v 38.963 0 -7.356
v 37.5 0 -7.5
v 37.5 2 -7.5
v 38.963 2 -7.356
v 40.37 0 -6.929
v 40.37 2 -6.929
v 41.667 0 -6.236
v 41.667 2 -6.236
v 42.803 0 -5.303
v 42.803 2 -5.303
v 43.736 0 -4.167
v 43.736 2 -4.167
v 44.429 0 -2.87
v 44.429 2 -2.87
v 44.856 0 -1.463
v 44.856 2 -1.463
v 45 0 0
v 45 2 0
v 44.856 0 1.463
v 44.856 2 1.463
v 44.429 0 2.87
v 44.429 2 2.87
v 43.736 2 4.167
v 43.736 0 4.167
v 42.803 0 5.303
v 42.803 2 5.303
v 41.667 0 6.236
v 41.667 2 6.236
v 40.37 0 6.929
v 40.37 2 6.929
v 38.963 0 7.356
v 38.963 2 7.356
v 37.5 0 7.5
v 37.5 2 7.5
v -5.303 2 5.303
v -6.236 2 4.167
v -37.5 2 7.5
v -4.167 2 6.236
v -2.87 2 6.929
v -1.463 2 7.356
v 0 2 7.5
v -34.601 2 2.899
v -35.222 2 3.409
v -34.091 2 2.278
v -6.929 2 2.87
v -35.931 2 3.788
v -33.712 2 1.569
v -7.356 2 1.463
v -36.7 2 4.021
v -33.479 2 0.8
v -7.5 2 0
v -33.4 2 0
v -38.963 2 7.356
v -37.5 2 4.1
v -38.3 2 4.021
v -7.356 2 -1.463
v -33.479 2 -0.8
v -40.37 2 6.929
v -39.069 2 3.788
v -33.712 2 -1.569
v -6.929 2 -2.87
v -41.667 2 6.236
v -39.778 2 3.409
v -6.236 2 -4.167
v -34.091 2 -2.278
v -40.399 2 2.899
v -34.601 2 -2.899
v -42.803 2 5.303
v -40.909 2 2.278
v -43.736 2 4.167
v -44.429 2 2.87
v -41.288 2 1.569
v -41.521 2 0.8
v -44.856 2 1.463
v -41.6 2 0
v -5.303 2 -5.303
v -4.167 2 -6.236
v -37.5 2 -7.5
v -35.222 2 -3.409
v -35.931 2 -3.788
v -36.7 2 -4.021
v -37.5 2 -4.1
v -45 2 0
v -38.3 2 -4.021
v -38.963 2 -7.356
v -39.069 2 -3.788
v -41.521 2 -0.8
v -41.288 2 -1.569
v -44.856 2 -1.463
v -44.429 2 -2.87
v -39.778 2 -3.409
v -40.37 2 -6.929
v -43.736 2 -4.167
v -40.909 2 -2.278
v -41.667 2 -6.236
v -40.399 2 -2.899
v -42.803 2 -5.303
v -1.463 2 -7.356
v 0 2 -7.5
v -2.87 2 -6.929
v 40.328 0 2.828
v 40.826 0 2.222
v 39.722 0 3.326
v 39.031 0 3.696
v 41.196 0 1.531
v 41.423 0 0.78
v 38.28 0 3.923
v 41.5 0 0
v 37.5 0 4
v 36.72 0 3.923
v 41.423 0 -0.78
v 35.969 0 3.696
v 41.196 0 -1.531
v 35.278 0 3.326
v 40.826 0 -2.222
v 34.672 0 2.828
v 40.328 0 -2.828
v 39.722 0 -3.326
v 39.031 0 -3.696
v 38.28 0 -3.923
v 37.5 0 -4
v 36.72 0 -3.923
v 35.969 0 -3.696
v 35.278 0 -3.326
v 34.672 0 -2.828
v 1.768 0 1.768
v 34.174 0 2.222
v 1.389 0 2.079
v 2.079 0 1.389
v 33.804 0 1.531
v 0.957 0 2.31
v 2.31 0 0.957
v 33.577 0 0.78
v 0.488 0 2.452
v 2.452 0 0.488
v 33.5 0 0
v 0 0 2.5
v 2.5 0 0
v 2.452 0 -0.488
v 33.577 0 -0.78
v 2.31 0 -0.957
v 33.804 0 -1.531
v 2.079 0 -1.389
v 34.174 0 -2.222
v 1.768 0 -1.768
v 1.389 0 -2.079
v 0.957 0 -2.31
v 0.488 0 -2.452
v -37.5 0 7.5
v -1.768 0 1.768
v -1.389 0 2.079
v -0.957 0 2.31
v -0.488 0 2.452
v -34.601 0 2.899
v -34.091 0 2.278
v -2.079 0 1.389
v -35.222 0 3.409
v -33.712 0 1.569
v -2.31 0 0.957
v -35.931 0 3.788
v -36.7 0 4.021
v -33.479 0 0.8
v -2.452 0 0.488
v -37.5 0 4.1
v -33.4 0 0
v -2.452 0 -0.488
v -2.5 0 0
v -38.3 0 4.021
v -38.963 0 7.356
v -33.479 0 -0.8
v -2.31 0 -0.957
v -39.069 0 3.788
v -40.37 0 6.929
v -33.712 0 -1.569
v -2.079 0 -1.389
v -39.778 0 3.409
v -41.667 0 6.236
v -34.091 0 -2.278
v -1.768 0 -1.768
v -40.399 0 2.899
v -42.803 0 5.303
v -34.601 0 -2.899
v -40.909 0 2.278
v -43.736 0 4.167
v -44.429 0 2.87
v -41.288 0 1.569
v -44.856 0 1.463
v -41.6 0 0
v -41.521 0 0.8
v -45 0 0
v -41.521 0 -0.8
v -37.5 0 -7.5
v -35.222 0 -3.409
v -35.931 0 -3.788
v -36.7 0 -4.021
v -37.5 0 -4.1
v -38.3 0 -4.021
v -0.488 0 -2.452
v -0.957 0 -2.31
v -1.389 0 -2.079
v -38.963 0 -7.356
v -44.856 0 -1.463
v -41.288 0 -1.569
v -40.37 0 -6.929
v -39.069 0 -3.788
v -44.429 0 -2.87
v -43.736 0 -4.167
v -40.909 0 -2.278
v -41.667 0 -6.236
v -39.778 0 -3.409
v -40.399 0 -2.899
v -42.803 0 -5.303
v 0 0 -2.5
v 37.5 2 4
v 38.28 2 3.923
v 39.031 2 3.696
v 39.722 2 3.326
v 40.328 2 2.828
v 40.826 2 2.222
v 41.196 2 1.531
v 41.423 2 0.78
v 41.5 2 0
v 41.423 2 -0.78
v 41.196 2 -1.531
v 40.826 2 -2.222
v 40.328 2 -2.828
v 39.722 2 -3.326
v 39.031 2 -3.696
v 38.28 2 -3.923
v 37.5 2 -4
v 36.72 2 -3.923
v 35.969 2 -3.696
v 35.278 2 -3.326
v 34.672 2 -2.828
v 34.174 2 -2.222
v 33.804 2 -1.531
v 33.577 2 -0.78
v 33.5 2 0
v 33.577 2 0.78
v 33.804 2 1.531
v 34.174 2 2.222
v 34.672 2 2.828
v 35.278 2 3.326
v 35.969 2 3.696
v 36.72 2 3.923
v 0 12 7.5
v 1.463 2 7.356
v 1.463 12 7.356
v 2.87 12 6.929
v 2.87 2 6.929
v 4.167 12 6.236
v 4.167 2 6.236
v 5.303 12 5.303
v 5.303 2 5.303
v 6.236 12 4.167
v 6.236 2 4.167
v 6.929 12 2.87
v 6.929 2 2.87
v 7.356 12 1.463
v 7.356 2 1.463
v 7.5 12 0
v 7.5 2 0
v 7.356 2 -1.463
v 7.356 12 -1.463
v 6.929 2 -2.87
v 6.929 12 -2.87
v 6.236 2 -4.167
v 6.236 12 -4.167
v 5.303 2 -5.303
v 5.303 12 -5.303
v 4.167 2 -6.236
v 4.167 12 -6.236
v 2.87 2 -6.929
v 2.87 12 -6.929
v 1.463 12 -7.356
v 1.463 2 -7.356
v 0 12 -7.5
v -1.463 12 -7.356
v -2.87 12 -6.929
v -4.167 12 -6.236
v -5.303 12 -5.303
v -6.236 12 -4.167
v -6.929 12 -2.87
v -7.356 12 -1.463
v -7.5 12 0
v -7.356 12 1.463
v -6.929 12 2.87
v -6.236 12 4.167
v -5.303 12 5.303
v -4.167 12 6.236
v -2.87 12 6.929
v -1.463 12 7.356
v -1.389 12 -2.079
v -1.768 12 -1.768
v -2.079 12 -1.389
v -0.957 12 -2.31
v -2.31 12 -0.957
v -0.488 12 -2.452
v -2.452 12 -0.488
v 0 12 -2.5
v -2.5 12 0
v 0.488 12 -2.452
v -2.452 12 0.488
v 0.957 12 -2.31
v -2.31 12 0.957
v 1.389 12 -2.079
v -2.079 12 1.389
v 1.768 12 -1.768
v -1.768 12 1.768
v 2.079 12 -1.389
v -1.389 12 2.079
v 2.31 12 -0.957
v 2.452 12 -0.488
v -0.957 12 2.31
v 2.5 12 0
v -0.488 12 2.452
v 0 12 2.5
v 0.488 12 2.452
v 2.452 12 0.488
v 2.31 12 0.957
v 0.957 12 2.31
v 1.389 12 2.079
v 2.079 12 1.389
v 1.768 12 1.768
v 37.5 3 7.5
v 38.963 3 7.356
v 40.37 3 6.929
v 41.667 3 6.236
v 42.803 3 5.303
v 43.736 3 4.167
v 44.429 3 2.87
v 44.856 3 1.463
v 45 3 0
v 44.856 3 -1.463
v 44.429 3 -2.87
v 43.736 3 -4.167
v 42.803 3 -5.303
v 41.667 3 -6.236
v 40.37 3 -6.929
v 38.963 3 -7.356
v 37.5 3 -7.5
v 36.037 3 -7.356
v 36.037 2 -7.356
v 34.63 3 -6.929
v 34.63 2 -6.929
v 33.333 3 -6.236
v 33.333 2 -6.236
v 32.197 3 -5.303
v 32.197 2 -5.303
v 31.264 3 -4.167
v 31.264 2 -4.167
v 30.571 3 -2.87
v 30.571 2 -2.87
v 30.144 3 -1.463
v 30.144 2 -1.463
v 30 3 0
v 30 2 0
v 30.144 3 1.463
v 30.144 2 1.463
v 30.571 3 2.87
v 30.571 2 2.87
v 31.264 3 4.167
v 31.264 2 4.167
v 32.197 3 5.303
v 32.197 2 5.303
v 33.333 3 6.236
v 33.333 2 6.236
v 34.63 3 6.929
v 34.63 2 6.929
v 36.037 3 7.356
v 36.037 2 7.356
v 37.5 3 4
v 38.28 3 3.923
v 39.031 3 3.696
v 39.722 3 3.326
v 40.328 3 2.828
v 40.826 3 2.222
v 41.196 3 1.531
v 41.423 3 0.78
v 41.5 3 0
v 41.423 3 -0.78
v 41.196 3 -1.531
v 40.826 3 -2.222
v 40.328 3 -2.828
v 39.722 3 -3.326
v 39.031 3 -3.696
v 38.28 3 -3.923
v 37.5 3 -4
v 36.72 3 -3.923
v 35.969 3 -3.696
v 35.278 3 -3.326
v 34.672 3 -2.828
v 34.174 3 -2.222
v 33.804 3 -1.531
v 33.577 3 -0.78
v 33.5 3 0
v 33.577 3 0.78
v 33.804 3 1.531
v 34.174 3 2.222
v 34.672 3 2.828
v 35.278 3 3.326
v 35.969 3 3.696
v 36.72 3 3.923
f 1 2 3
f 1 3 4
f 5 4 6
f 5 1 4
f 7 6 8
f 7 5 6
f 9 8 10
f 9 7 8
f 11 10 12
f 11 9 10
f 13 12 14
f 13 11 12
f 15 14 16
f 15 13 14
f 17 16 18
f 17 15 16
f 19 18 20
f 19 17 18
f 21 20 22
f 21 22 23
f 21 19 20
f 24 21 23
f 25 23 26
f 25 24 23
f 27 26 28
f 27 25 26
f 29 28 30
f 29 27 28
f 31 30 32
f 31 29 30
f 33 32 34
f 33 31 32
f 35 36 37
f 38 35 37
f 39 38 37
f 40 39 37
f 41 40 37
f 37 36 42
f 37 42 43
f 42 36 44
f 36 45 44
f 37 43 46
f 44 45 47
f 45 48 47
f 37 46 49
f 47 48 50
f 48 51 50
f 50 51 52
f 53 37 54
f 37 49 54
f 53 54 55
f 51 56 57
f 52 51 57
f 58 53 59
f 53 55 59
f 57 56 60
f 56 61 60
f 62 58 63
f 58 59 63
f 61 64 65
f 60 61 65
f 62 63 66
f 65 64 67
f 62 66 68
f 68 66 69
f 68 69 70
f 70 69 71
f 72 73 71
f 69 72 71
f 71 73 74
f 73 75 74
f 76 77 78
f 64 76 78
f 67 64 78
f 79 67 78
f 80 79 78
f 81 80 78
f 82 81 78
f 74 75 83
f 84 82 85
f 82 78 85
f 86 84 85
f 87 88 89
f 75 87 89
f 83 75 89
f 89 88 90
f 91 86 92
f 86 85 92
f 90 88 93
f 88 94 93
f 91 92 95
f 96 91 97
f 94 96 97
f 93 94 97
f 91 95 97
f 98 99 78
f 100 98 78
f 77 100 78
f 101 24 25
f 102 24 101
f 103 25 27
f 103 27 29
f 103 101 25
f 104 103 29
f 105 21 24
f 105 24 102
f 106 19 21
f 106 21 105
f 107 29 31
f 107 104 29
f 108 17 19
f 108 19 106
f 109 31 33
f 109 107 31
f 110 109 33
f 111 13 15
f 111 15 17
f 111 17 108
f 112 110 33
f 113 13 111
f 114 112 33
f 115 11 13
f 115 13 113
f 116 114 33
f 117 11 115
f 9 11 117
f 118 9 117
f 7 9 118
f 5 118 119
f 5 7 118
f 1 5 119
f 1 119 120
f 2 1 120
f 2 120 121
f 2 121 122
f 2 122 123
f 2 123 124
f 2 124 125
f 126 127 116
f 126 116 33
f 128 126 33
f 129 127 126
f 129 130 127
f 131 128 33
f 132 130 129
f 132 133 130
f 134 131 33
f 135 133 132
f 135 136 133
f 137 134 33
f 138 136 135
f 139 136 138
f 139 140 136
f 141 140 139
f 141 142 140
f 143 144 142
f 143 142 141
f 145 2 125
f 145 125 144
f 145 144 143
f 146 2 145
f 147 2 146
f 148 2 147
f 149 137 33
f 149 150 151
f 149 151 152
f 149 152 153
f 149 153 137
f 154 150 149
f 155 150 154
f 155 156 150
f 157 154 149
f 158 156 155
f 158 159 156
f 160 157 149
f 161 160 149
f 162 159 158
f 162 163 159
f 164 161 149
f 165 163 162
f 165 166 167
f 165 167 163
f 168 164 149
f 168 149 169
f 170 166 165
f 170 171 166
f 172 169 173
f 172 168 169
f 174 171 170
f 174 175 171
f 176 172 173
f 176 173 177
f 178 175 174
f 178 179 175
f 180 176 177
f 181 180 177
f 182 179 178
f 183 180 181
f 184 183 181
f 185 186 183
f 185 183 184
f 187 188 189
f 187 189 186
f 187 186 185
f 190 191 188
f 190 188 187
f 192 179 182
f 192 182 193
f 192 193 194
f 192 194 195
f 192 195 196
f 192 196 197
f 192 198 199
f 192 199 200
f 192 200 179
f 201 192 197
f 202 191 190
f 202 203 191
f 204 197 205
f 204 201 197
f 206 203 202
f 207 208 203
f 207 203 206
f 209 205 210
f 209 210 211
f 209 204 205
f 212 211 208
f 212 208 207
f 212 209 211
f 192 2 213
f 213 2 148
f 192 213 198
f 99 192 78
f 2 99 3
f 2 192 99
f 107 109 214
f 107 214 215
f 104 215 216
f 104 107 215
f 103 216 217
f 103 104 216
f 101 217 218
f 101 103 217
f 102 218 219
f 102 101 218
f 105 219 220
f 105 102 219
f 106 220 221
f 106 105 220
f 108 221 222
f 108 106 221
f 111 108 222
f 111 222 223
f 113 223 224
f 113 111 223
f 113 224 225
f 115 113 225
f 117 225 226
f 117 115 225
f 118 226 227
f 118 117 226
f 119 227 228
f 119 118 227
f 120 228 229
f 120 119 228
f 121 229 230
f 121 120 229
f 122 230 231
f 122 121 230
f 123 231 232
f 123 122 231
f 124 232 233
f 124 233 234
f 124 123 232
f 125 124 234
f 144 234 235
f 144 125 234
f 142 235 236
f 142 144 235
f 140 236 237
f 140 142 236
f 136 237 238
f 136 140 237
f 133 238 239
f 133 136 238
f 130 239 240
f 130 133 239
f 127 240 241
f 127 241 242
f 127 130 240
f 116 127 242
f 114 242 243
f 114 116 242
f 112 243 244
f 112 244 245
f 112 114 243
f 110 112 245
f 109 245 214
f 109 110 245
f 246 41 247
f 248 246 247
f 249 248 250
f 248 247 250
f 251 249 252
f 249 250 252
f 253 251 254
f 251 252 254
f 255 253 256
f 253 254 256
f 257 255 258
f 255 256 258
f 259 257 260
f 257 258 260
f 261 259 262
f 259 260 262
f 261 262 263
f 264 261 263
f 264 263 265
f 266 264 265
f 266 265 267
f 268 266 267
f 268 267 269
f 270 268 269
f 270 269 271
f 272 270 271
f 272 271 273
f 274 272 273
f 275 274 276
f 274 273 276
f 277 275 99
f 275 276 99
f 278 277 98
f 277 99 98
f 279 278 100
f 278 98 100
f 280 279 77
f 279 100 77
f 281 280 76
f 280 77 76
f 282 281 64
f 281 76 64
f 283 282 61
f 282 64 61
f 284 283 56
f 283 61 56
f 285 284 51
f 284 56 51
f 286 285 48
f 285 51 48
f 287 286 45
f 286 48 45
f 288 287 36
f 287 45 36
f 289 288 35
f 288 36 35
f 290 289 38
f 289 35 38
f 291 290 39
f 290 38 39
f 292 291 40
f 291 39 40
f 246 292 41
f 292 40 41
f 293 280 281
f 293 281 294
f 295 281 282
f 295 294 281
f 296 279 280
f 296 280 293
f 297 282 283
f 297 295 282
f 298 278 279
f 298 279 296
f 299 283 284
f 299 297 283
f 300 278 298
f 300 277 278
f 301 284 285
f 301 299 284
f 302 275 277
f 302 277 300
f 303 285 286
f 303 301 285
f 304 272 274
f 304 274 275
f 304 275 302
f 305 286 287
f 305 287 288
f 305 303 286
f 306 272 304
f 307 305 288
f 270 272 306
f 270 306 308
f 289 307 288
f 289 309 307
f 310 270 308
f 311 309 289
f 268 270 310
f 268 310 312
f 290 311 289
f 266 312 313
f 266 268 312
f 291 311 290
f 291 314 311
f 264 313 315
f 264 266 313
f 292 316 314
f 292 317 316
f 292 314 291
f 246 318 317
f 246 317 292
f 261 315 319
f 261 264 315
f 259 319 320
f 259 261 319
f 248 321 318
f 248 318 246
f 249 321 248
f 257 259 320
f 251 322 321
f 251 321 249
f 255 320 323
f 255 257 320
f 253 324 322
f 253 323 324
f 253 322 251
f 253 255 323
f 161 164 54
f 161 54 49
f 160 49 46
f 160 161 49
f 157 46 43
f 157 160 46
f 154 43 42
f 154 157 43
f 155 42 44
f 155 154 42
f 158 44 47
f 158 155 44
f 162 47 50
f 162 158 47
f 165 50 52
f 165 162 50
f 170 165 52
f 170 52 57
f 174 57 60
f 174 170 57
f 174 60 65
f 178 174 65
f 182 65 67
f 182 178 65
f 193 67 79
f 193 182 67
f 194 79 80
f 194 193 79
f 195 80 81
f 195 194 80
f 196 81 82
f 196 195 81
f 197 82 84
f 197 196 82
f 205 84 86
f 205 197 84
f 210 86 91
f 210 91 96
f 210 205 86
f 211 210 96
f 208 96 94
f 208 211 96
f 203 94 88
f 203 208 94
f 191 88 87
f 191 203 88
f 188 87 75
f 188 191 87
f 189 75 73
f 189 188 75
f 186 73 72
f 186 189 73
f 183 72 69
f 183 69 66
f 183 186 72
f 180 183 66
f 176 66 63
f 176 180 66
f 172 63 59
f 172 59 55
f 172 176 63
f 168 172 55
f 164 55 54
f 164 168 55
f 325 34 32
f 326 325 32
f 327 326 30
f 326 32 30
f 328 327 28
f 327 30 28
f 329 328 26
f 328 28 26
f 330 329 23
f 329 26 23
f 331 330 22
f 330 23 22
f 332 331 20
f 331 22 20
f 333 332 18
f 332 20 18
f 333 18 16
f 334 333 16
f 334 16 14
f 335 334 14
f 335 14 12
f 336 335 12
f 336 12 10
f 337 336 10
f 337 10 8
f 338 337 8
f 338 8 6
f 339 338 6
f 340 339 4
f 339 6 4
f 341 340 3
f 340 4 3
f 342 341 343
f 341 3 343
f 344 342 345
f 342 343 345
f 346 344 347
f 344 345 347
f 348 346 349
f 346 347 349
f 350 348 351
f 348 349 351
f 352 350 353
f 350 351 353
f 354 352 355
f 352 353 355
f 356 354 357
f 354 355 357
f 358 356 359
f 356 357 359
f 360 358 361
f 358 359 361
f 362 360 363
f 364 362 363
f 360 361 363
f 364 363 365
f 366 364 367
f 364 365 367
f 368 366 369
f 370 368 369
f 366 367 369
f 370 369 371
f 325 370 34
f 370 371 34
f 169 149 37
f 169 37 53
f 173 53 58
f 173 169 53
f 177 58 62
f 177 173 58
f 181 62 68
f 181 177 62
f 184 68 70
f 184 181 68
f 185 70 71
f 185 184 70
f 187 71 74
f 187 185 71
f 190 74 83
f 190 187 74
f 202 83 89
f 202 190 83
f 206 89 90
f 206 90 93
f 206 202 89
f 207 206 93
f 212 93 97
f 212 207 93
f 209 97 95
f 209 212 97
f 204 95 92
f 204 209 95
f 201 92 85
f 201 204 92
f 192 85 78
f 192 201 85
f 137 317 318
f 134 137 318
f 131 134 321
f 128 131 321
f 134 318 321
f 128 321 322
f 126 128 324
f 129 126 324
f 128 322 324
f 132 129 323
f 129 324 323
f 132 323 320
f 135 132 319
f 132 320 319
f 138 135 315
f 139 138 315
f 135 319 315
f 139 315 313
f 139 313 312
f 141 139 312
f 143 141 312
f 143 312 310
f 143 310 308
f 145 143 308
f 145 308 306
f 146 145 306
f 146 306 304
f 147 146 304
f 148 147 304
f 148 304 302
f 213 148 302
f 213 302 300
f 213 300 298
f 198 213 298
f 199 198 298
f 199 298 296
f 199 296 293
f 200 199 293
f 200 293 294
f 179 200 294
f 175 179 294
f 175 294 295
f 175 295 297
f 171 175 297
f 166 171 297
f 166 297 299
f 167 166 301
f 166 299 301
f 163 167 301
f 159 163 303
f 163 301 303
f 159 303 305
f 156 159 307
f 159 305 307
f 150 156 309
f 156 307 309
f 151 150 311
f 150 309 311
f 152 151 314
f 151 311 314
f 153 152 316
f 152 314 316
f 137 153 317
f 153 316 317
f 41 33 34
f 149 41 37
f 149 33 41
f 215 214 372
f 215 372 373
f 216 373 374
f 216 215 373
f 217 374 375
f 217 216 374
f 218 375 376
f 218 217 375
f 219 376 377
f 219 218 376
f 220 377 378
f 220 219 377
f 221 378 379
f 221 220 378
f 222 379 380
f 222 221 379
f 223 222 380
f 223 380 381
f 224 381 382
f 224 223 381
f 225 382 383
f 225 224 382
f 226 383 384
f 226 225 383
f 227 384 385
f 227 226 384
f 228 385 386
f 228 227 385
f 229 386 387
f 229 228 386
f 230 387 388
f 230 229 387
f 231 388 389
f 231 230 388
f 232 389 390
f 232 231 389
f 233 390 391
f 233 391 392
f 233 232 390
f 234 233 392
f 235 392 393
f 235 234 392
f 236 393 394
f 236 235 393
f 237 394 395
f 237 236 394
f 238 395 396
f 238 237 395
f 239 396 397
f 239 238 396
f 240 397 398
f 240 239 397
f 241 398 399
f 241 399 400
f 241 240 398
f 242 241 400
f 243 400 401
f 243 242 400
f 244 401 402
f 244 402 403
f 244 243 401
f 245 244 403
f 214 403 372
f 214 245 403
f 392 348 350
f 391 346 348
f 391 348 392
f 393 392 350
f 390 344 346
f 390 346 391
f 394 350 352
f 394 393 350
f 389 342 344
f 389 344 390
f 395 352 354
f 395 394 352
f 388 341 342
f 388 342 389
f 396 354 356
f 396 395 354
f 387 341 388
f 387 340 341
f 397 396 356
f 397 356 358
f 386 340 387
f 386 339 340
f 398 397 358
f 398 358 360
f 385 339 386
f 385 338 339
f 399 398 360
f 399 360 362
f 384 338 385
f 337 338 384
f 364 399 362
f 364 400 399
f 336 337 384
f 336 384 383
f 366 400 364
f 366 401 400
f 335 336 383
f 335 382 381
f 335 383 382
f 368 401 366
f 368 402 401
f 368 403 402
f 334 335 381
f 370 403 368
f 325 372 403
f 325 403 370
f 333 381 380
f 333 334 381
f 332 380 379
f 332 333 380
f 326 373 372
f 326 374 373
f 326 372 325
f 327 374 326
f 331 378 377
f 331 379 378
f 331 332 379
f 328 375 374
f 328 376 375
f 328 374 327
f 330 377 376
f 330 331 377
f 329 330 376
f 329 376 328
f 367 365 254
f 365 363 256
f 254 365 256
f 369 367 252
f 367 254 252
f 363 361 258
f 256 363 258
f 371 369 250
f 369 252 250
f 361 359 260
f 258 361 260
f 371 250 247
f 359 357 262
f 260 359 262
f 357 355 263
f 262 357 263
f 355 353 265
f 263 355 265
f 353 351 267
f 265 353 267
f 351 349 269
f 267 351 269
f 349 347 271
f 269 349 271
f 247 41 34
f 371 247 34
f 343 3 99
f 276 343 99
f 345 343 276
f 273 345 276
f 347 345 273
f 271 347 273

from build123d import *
from build123d.topology import SkipClean

# Parameters (mm, degrees)
SKETCH1_R           = 4.1
SKETCH1_R_2         = 4
BOSS_EXTRUDE1_DEPTH = 2
SKETCH3_R           = 7.5
BOSS_EXTRUDE3_DEPTH = 10
SKETCH4_R           = 2.5
CUT_EXTRUDE1_DEPTH  = 48.172555581
SKETCH5_R           = 7.5
SKETCH5_R_2         = 4
BOSS_EXTRUDE4_DEPTH = 1


with BuildPart() as part:
    # Sketch1 → Boss-Extrude1 (new body)
    with BuildSketch(Plane(origin=(0, 0, 0), x_dir=(1, 0, 0), z_dir=(0, 1, 0))):
        with BuildLine():
            Line((-37.5, 7.5), (37.5, 7.5))
            ThreePointArc((37.5, 7.5), (45, 0), (37.5, -7.5))
            Line((37.5, -7.5), (-37.5, -7.5))
            ThreePointArc((-37.5, -7.5), (-45, 0), (-37.5, 7.5))
        make_face()
        with Locations((-37.5, 0)):
            Circle(SKETCH1_R, mode=Mode.SUBTRACT)
        with Locations((37.5, 0)):
            Circle(SKETCH1_R_2, mode=Mode.SUBTRACT)
    extrude(amount=BOSS_EXTRUDE1_DEPTH)

    # Sketch3 → Boss-Extrude3 (add)
    with BuildSketch(Plane(origin=(0, 2, 0), x_dir=(1, 0, 0), z_dir=(0, 1, 0))):
        Circle(SKETCH3_R)
    extrude(amount=BOSS_EXTRUDE3_DEPTH)

    # Sketch4 → Cut-Extrude1 (cut, through all)
    with BuildSketch(Plane(origin=(0, 12, 0), x_dir=(1, 0, 0), z_dir=(0, 1, 0))):
        Circle(SKETCH4_R)
    extrude(amount=-CUT_EXTRUDE1_DEPTH, mode=Mode.SUBTRACT)

    # Sketch5 → Boss-Extrude4 (add)
    with SkipClean():  # the faces are left unmerged after this step: merging them gives an invalid solid
        with BuildSketch(Plane(origin=(0, 2, 0), x_dir=(1, 0, 0), z_dir=(0, 1, 0))):
            with Locations((37.5, 0)):
                Circle(SKETCH5_R)
            with Locations((37.5, 0)):
                Circle(SKETCH5_R_2, mode=Mode.SUBTRACT)
        extrude(amount=BOSS_EXTRUDE4_DEPTH)
    add(part.part.scale(1), mode=Mode.REPLACE)  # the faces are merged on a copy


solid = part.part
